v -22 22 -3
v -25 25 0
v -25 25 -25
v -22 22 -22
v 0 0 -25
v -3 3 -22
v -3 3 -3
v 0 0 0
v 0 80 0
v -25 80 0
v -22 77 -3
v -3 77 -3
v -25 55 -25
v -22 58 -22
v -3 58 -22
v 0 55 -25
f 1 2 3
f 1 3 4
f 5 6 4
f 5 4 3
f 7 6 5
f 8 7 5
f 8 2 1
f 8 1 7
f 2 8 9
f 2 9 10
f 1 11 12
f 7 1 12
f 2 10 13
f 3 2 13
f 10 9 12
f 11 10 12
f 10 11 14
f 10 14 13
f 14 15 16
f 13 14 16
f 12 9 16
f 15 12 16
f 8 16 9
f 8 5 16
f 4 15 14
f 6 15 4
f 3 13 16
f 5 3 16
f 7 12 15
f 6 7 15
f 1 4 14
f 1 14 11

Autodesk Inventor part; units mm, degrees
ref_plane "YZ Plane" through (0, 0, 0) normal (1, 0, 0) x (0, 1, 0)
ref_plane "XZ Plane" through (0, 0, 0) normal (0, 1, 0) x (-1, 0, 0)
ref_plane "XY Plane" through (0, 0, 0) normal (0, 0, 1) x (1, 0, 0)
sketch "Sketch1" plane through (0, 0, 0) normal (0, 1, 0) x (-1, 0, 0)
  line L0 (0, 0) -> (25, 0)
  line L1 (25, 0) -> (25, -25)
  line L2 (25, -25) -> (0, -25)
  line L3 (0, -25) -> (0, 0)
  line L4 (22, -22) -> (22, -3)
  line L5 (22, -3) -> (3, -3)
  line L6 (3, -3) -> (3, -22)
  line L7 (3, -22) -> (22, -22)
  dimension "d0" = 25
  dimension "d1" = 25
  dimension "d2" = 3
extrude "Extrusion1" add sketch "Sketch1" along normal blind 80
sketch "Sketch2" plane through (0, 0, 0) normal (1, 0, 0) x (0, 0, -1)
  line L0 (0, 0) -> (25, 0) projected
  line L1 (25, 0) -> (25, 80) projected
  line L2 (0, 80) -> (25, 80) projected
  line L3 (0, 0) -> (0, 80) projected
  line L4 (0, 0) -> (0, 80) projected
  line L5 (0, 80) -> (25, 55)
  line L6 (0, 80) -> (35.3553, 80) construction
  dimension "d5" = 45
extrude "Extrusion2" cut sketch "Sketch2" against normal blind 80 contours L2 L1 L5
sketch "Sketch3" plane through (-25, 0, 0) normal (0, 0, 1) x (1, 0, 0)
  line L0 (3, 0) -> (3, 77) projected
  line L1 (0, 0) -> (25, 0) projected
  line L2 (25, 0) -> (25, 80) projected
  line L3 (0, 80) -> (25, 80) projected
  line L4 (0, 0) -> (0, 80) projected
  line L5 (25, 0) -> (0, 0) projected
  line L6 (0, 25) -> (25, 0)
  dimension "d8" = 45
extrude "Extrusion3" cut sketch "Sketch3" against normal blind 44.75 contours L1 L4 L6 L0 | L0 L6 L1
properties part number "P404" material "Aluminum 6061"
